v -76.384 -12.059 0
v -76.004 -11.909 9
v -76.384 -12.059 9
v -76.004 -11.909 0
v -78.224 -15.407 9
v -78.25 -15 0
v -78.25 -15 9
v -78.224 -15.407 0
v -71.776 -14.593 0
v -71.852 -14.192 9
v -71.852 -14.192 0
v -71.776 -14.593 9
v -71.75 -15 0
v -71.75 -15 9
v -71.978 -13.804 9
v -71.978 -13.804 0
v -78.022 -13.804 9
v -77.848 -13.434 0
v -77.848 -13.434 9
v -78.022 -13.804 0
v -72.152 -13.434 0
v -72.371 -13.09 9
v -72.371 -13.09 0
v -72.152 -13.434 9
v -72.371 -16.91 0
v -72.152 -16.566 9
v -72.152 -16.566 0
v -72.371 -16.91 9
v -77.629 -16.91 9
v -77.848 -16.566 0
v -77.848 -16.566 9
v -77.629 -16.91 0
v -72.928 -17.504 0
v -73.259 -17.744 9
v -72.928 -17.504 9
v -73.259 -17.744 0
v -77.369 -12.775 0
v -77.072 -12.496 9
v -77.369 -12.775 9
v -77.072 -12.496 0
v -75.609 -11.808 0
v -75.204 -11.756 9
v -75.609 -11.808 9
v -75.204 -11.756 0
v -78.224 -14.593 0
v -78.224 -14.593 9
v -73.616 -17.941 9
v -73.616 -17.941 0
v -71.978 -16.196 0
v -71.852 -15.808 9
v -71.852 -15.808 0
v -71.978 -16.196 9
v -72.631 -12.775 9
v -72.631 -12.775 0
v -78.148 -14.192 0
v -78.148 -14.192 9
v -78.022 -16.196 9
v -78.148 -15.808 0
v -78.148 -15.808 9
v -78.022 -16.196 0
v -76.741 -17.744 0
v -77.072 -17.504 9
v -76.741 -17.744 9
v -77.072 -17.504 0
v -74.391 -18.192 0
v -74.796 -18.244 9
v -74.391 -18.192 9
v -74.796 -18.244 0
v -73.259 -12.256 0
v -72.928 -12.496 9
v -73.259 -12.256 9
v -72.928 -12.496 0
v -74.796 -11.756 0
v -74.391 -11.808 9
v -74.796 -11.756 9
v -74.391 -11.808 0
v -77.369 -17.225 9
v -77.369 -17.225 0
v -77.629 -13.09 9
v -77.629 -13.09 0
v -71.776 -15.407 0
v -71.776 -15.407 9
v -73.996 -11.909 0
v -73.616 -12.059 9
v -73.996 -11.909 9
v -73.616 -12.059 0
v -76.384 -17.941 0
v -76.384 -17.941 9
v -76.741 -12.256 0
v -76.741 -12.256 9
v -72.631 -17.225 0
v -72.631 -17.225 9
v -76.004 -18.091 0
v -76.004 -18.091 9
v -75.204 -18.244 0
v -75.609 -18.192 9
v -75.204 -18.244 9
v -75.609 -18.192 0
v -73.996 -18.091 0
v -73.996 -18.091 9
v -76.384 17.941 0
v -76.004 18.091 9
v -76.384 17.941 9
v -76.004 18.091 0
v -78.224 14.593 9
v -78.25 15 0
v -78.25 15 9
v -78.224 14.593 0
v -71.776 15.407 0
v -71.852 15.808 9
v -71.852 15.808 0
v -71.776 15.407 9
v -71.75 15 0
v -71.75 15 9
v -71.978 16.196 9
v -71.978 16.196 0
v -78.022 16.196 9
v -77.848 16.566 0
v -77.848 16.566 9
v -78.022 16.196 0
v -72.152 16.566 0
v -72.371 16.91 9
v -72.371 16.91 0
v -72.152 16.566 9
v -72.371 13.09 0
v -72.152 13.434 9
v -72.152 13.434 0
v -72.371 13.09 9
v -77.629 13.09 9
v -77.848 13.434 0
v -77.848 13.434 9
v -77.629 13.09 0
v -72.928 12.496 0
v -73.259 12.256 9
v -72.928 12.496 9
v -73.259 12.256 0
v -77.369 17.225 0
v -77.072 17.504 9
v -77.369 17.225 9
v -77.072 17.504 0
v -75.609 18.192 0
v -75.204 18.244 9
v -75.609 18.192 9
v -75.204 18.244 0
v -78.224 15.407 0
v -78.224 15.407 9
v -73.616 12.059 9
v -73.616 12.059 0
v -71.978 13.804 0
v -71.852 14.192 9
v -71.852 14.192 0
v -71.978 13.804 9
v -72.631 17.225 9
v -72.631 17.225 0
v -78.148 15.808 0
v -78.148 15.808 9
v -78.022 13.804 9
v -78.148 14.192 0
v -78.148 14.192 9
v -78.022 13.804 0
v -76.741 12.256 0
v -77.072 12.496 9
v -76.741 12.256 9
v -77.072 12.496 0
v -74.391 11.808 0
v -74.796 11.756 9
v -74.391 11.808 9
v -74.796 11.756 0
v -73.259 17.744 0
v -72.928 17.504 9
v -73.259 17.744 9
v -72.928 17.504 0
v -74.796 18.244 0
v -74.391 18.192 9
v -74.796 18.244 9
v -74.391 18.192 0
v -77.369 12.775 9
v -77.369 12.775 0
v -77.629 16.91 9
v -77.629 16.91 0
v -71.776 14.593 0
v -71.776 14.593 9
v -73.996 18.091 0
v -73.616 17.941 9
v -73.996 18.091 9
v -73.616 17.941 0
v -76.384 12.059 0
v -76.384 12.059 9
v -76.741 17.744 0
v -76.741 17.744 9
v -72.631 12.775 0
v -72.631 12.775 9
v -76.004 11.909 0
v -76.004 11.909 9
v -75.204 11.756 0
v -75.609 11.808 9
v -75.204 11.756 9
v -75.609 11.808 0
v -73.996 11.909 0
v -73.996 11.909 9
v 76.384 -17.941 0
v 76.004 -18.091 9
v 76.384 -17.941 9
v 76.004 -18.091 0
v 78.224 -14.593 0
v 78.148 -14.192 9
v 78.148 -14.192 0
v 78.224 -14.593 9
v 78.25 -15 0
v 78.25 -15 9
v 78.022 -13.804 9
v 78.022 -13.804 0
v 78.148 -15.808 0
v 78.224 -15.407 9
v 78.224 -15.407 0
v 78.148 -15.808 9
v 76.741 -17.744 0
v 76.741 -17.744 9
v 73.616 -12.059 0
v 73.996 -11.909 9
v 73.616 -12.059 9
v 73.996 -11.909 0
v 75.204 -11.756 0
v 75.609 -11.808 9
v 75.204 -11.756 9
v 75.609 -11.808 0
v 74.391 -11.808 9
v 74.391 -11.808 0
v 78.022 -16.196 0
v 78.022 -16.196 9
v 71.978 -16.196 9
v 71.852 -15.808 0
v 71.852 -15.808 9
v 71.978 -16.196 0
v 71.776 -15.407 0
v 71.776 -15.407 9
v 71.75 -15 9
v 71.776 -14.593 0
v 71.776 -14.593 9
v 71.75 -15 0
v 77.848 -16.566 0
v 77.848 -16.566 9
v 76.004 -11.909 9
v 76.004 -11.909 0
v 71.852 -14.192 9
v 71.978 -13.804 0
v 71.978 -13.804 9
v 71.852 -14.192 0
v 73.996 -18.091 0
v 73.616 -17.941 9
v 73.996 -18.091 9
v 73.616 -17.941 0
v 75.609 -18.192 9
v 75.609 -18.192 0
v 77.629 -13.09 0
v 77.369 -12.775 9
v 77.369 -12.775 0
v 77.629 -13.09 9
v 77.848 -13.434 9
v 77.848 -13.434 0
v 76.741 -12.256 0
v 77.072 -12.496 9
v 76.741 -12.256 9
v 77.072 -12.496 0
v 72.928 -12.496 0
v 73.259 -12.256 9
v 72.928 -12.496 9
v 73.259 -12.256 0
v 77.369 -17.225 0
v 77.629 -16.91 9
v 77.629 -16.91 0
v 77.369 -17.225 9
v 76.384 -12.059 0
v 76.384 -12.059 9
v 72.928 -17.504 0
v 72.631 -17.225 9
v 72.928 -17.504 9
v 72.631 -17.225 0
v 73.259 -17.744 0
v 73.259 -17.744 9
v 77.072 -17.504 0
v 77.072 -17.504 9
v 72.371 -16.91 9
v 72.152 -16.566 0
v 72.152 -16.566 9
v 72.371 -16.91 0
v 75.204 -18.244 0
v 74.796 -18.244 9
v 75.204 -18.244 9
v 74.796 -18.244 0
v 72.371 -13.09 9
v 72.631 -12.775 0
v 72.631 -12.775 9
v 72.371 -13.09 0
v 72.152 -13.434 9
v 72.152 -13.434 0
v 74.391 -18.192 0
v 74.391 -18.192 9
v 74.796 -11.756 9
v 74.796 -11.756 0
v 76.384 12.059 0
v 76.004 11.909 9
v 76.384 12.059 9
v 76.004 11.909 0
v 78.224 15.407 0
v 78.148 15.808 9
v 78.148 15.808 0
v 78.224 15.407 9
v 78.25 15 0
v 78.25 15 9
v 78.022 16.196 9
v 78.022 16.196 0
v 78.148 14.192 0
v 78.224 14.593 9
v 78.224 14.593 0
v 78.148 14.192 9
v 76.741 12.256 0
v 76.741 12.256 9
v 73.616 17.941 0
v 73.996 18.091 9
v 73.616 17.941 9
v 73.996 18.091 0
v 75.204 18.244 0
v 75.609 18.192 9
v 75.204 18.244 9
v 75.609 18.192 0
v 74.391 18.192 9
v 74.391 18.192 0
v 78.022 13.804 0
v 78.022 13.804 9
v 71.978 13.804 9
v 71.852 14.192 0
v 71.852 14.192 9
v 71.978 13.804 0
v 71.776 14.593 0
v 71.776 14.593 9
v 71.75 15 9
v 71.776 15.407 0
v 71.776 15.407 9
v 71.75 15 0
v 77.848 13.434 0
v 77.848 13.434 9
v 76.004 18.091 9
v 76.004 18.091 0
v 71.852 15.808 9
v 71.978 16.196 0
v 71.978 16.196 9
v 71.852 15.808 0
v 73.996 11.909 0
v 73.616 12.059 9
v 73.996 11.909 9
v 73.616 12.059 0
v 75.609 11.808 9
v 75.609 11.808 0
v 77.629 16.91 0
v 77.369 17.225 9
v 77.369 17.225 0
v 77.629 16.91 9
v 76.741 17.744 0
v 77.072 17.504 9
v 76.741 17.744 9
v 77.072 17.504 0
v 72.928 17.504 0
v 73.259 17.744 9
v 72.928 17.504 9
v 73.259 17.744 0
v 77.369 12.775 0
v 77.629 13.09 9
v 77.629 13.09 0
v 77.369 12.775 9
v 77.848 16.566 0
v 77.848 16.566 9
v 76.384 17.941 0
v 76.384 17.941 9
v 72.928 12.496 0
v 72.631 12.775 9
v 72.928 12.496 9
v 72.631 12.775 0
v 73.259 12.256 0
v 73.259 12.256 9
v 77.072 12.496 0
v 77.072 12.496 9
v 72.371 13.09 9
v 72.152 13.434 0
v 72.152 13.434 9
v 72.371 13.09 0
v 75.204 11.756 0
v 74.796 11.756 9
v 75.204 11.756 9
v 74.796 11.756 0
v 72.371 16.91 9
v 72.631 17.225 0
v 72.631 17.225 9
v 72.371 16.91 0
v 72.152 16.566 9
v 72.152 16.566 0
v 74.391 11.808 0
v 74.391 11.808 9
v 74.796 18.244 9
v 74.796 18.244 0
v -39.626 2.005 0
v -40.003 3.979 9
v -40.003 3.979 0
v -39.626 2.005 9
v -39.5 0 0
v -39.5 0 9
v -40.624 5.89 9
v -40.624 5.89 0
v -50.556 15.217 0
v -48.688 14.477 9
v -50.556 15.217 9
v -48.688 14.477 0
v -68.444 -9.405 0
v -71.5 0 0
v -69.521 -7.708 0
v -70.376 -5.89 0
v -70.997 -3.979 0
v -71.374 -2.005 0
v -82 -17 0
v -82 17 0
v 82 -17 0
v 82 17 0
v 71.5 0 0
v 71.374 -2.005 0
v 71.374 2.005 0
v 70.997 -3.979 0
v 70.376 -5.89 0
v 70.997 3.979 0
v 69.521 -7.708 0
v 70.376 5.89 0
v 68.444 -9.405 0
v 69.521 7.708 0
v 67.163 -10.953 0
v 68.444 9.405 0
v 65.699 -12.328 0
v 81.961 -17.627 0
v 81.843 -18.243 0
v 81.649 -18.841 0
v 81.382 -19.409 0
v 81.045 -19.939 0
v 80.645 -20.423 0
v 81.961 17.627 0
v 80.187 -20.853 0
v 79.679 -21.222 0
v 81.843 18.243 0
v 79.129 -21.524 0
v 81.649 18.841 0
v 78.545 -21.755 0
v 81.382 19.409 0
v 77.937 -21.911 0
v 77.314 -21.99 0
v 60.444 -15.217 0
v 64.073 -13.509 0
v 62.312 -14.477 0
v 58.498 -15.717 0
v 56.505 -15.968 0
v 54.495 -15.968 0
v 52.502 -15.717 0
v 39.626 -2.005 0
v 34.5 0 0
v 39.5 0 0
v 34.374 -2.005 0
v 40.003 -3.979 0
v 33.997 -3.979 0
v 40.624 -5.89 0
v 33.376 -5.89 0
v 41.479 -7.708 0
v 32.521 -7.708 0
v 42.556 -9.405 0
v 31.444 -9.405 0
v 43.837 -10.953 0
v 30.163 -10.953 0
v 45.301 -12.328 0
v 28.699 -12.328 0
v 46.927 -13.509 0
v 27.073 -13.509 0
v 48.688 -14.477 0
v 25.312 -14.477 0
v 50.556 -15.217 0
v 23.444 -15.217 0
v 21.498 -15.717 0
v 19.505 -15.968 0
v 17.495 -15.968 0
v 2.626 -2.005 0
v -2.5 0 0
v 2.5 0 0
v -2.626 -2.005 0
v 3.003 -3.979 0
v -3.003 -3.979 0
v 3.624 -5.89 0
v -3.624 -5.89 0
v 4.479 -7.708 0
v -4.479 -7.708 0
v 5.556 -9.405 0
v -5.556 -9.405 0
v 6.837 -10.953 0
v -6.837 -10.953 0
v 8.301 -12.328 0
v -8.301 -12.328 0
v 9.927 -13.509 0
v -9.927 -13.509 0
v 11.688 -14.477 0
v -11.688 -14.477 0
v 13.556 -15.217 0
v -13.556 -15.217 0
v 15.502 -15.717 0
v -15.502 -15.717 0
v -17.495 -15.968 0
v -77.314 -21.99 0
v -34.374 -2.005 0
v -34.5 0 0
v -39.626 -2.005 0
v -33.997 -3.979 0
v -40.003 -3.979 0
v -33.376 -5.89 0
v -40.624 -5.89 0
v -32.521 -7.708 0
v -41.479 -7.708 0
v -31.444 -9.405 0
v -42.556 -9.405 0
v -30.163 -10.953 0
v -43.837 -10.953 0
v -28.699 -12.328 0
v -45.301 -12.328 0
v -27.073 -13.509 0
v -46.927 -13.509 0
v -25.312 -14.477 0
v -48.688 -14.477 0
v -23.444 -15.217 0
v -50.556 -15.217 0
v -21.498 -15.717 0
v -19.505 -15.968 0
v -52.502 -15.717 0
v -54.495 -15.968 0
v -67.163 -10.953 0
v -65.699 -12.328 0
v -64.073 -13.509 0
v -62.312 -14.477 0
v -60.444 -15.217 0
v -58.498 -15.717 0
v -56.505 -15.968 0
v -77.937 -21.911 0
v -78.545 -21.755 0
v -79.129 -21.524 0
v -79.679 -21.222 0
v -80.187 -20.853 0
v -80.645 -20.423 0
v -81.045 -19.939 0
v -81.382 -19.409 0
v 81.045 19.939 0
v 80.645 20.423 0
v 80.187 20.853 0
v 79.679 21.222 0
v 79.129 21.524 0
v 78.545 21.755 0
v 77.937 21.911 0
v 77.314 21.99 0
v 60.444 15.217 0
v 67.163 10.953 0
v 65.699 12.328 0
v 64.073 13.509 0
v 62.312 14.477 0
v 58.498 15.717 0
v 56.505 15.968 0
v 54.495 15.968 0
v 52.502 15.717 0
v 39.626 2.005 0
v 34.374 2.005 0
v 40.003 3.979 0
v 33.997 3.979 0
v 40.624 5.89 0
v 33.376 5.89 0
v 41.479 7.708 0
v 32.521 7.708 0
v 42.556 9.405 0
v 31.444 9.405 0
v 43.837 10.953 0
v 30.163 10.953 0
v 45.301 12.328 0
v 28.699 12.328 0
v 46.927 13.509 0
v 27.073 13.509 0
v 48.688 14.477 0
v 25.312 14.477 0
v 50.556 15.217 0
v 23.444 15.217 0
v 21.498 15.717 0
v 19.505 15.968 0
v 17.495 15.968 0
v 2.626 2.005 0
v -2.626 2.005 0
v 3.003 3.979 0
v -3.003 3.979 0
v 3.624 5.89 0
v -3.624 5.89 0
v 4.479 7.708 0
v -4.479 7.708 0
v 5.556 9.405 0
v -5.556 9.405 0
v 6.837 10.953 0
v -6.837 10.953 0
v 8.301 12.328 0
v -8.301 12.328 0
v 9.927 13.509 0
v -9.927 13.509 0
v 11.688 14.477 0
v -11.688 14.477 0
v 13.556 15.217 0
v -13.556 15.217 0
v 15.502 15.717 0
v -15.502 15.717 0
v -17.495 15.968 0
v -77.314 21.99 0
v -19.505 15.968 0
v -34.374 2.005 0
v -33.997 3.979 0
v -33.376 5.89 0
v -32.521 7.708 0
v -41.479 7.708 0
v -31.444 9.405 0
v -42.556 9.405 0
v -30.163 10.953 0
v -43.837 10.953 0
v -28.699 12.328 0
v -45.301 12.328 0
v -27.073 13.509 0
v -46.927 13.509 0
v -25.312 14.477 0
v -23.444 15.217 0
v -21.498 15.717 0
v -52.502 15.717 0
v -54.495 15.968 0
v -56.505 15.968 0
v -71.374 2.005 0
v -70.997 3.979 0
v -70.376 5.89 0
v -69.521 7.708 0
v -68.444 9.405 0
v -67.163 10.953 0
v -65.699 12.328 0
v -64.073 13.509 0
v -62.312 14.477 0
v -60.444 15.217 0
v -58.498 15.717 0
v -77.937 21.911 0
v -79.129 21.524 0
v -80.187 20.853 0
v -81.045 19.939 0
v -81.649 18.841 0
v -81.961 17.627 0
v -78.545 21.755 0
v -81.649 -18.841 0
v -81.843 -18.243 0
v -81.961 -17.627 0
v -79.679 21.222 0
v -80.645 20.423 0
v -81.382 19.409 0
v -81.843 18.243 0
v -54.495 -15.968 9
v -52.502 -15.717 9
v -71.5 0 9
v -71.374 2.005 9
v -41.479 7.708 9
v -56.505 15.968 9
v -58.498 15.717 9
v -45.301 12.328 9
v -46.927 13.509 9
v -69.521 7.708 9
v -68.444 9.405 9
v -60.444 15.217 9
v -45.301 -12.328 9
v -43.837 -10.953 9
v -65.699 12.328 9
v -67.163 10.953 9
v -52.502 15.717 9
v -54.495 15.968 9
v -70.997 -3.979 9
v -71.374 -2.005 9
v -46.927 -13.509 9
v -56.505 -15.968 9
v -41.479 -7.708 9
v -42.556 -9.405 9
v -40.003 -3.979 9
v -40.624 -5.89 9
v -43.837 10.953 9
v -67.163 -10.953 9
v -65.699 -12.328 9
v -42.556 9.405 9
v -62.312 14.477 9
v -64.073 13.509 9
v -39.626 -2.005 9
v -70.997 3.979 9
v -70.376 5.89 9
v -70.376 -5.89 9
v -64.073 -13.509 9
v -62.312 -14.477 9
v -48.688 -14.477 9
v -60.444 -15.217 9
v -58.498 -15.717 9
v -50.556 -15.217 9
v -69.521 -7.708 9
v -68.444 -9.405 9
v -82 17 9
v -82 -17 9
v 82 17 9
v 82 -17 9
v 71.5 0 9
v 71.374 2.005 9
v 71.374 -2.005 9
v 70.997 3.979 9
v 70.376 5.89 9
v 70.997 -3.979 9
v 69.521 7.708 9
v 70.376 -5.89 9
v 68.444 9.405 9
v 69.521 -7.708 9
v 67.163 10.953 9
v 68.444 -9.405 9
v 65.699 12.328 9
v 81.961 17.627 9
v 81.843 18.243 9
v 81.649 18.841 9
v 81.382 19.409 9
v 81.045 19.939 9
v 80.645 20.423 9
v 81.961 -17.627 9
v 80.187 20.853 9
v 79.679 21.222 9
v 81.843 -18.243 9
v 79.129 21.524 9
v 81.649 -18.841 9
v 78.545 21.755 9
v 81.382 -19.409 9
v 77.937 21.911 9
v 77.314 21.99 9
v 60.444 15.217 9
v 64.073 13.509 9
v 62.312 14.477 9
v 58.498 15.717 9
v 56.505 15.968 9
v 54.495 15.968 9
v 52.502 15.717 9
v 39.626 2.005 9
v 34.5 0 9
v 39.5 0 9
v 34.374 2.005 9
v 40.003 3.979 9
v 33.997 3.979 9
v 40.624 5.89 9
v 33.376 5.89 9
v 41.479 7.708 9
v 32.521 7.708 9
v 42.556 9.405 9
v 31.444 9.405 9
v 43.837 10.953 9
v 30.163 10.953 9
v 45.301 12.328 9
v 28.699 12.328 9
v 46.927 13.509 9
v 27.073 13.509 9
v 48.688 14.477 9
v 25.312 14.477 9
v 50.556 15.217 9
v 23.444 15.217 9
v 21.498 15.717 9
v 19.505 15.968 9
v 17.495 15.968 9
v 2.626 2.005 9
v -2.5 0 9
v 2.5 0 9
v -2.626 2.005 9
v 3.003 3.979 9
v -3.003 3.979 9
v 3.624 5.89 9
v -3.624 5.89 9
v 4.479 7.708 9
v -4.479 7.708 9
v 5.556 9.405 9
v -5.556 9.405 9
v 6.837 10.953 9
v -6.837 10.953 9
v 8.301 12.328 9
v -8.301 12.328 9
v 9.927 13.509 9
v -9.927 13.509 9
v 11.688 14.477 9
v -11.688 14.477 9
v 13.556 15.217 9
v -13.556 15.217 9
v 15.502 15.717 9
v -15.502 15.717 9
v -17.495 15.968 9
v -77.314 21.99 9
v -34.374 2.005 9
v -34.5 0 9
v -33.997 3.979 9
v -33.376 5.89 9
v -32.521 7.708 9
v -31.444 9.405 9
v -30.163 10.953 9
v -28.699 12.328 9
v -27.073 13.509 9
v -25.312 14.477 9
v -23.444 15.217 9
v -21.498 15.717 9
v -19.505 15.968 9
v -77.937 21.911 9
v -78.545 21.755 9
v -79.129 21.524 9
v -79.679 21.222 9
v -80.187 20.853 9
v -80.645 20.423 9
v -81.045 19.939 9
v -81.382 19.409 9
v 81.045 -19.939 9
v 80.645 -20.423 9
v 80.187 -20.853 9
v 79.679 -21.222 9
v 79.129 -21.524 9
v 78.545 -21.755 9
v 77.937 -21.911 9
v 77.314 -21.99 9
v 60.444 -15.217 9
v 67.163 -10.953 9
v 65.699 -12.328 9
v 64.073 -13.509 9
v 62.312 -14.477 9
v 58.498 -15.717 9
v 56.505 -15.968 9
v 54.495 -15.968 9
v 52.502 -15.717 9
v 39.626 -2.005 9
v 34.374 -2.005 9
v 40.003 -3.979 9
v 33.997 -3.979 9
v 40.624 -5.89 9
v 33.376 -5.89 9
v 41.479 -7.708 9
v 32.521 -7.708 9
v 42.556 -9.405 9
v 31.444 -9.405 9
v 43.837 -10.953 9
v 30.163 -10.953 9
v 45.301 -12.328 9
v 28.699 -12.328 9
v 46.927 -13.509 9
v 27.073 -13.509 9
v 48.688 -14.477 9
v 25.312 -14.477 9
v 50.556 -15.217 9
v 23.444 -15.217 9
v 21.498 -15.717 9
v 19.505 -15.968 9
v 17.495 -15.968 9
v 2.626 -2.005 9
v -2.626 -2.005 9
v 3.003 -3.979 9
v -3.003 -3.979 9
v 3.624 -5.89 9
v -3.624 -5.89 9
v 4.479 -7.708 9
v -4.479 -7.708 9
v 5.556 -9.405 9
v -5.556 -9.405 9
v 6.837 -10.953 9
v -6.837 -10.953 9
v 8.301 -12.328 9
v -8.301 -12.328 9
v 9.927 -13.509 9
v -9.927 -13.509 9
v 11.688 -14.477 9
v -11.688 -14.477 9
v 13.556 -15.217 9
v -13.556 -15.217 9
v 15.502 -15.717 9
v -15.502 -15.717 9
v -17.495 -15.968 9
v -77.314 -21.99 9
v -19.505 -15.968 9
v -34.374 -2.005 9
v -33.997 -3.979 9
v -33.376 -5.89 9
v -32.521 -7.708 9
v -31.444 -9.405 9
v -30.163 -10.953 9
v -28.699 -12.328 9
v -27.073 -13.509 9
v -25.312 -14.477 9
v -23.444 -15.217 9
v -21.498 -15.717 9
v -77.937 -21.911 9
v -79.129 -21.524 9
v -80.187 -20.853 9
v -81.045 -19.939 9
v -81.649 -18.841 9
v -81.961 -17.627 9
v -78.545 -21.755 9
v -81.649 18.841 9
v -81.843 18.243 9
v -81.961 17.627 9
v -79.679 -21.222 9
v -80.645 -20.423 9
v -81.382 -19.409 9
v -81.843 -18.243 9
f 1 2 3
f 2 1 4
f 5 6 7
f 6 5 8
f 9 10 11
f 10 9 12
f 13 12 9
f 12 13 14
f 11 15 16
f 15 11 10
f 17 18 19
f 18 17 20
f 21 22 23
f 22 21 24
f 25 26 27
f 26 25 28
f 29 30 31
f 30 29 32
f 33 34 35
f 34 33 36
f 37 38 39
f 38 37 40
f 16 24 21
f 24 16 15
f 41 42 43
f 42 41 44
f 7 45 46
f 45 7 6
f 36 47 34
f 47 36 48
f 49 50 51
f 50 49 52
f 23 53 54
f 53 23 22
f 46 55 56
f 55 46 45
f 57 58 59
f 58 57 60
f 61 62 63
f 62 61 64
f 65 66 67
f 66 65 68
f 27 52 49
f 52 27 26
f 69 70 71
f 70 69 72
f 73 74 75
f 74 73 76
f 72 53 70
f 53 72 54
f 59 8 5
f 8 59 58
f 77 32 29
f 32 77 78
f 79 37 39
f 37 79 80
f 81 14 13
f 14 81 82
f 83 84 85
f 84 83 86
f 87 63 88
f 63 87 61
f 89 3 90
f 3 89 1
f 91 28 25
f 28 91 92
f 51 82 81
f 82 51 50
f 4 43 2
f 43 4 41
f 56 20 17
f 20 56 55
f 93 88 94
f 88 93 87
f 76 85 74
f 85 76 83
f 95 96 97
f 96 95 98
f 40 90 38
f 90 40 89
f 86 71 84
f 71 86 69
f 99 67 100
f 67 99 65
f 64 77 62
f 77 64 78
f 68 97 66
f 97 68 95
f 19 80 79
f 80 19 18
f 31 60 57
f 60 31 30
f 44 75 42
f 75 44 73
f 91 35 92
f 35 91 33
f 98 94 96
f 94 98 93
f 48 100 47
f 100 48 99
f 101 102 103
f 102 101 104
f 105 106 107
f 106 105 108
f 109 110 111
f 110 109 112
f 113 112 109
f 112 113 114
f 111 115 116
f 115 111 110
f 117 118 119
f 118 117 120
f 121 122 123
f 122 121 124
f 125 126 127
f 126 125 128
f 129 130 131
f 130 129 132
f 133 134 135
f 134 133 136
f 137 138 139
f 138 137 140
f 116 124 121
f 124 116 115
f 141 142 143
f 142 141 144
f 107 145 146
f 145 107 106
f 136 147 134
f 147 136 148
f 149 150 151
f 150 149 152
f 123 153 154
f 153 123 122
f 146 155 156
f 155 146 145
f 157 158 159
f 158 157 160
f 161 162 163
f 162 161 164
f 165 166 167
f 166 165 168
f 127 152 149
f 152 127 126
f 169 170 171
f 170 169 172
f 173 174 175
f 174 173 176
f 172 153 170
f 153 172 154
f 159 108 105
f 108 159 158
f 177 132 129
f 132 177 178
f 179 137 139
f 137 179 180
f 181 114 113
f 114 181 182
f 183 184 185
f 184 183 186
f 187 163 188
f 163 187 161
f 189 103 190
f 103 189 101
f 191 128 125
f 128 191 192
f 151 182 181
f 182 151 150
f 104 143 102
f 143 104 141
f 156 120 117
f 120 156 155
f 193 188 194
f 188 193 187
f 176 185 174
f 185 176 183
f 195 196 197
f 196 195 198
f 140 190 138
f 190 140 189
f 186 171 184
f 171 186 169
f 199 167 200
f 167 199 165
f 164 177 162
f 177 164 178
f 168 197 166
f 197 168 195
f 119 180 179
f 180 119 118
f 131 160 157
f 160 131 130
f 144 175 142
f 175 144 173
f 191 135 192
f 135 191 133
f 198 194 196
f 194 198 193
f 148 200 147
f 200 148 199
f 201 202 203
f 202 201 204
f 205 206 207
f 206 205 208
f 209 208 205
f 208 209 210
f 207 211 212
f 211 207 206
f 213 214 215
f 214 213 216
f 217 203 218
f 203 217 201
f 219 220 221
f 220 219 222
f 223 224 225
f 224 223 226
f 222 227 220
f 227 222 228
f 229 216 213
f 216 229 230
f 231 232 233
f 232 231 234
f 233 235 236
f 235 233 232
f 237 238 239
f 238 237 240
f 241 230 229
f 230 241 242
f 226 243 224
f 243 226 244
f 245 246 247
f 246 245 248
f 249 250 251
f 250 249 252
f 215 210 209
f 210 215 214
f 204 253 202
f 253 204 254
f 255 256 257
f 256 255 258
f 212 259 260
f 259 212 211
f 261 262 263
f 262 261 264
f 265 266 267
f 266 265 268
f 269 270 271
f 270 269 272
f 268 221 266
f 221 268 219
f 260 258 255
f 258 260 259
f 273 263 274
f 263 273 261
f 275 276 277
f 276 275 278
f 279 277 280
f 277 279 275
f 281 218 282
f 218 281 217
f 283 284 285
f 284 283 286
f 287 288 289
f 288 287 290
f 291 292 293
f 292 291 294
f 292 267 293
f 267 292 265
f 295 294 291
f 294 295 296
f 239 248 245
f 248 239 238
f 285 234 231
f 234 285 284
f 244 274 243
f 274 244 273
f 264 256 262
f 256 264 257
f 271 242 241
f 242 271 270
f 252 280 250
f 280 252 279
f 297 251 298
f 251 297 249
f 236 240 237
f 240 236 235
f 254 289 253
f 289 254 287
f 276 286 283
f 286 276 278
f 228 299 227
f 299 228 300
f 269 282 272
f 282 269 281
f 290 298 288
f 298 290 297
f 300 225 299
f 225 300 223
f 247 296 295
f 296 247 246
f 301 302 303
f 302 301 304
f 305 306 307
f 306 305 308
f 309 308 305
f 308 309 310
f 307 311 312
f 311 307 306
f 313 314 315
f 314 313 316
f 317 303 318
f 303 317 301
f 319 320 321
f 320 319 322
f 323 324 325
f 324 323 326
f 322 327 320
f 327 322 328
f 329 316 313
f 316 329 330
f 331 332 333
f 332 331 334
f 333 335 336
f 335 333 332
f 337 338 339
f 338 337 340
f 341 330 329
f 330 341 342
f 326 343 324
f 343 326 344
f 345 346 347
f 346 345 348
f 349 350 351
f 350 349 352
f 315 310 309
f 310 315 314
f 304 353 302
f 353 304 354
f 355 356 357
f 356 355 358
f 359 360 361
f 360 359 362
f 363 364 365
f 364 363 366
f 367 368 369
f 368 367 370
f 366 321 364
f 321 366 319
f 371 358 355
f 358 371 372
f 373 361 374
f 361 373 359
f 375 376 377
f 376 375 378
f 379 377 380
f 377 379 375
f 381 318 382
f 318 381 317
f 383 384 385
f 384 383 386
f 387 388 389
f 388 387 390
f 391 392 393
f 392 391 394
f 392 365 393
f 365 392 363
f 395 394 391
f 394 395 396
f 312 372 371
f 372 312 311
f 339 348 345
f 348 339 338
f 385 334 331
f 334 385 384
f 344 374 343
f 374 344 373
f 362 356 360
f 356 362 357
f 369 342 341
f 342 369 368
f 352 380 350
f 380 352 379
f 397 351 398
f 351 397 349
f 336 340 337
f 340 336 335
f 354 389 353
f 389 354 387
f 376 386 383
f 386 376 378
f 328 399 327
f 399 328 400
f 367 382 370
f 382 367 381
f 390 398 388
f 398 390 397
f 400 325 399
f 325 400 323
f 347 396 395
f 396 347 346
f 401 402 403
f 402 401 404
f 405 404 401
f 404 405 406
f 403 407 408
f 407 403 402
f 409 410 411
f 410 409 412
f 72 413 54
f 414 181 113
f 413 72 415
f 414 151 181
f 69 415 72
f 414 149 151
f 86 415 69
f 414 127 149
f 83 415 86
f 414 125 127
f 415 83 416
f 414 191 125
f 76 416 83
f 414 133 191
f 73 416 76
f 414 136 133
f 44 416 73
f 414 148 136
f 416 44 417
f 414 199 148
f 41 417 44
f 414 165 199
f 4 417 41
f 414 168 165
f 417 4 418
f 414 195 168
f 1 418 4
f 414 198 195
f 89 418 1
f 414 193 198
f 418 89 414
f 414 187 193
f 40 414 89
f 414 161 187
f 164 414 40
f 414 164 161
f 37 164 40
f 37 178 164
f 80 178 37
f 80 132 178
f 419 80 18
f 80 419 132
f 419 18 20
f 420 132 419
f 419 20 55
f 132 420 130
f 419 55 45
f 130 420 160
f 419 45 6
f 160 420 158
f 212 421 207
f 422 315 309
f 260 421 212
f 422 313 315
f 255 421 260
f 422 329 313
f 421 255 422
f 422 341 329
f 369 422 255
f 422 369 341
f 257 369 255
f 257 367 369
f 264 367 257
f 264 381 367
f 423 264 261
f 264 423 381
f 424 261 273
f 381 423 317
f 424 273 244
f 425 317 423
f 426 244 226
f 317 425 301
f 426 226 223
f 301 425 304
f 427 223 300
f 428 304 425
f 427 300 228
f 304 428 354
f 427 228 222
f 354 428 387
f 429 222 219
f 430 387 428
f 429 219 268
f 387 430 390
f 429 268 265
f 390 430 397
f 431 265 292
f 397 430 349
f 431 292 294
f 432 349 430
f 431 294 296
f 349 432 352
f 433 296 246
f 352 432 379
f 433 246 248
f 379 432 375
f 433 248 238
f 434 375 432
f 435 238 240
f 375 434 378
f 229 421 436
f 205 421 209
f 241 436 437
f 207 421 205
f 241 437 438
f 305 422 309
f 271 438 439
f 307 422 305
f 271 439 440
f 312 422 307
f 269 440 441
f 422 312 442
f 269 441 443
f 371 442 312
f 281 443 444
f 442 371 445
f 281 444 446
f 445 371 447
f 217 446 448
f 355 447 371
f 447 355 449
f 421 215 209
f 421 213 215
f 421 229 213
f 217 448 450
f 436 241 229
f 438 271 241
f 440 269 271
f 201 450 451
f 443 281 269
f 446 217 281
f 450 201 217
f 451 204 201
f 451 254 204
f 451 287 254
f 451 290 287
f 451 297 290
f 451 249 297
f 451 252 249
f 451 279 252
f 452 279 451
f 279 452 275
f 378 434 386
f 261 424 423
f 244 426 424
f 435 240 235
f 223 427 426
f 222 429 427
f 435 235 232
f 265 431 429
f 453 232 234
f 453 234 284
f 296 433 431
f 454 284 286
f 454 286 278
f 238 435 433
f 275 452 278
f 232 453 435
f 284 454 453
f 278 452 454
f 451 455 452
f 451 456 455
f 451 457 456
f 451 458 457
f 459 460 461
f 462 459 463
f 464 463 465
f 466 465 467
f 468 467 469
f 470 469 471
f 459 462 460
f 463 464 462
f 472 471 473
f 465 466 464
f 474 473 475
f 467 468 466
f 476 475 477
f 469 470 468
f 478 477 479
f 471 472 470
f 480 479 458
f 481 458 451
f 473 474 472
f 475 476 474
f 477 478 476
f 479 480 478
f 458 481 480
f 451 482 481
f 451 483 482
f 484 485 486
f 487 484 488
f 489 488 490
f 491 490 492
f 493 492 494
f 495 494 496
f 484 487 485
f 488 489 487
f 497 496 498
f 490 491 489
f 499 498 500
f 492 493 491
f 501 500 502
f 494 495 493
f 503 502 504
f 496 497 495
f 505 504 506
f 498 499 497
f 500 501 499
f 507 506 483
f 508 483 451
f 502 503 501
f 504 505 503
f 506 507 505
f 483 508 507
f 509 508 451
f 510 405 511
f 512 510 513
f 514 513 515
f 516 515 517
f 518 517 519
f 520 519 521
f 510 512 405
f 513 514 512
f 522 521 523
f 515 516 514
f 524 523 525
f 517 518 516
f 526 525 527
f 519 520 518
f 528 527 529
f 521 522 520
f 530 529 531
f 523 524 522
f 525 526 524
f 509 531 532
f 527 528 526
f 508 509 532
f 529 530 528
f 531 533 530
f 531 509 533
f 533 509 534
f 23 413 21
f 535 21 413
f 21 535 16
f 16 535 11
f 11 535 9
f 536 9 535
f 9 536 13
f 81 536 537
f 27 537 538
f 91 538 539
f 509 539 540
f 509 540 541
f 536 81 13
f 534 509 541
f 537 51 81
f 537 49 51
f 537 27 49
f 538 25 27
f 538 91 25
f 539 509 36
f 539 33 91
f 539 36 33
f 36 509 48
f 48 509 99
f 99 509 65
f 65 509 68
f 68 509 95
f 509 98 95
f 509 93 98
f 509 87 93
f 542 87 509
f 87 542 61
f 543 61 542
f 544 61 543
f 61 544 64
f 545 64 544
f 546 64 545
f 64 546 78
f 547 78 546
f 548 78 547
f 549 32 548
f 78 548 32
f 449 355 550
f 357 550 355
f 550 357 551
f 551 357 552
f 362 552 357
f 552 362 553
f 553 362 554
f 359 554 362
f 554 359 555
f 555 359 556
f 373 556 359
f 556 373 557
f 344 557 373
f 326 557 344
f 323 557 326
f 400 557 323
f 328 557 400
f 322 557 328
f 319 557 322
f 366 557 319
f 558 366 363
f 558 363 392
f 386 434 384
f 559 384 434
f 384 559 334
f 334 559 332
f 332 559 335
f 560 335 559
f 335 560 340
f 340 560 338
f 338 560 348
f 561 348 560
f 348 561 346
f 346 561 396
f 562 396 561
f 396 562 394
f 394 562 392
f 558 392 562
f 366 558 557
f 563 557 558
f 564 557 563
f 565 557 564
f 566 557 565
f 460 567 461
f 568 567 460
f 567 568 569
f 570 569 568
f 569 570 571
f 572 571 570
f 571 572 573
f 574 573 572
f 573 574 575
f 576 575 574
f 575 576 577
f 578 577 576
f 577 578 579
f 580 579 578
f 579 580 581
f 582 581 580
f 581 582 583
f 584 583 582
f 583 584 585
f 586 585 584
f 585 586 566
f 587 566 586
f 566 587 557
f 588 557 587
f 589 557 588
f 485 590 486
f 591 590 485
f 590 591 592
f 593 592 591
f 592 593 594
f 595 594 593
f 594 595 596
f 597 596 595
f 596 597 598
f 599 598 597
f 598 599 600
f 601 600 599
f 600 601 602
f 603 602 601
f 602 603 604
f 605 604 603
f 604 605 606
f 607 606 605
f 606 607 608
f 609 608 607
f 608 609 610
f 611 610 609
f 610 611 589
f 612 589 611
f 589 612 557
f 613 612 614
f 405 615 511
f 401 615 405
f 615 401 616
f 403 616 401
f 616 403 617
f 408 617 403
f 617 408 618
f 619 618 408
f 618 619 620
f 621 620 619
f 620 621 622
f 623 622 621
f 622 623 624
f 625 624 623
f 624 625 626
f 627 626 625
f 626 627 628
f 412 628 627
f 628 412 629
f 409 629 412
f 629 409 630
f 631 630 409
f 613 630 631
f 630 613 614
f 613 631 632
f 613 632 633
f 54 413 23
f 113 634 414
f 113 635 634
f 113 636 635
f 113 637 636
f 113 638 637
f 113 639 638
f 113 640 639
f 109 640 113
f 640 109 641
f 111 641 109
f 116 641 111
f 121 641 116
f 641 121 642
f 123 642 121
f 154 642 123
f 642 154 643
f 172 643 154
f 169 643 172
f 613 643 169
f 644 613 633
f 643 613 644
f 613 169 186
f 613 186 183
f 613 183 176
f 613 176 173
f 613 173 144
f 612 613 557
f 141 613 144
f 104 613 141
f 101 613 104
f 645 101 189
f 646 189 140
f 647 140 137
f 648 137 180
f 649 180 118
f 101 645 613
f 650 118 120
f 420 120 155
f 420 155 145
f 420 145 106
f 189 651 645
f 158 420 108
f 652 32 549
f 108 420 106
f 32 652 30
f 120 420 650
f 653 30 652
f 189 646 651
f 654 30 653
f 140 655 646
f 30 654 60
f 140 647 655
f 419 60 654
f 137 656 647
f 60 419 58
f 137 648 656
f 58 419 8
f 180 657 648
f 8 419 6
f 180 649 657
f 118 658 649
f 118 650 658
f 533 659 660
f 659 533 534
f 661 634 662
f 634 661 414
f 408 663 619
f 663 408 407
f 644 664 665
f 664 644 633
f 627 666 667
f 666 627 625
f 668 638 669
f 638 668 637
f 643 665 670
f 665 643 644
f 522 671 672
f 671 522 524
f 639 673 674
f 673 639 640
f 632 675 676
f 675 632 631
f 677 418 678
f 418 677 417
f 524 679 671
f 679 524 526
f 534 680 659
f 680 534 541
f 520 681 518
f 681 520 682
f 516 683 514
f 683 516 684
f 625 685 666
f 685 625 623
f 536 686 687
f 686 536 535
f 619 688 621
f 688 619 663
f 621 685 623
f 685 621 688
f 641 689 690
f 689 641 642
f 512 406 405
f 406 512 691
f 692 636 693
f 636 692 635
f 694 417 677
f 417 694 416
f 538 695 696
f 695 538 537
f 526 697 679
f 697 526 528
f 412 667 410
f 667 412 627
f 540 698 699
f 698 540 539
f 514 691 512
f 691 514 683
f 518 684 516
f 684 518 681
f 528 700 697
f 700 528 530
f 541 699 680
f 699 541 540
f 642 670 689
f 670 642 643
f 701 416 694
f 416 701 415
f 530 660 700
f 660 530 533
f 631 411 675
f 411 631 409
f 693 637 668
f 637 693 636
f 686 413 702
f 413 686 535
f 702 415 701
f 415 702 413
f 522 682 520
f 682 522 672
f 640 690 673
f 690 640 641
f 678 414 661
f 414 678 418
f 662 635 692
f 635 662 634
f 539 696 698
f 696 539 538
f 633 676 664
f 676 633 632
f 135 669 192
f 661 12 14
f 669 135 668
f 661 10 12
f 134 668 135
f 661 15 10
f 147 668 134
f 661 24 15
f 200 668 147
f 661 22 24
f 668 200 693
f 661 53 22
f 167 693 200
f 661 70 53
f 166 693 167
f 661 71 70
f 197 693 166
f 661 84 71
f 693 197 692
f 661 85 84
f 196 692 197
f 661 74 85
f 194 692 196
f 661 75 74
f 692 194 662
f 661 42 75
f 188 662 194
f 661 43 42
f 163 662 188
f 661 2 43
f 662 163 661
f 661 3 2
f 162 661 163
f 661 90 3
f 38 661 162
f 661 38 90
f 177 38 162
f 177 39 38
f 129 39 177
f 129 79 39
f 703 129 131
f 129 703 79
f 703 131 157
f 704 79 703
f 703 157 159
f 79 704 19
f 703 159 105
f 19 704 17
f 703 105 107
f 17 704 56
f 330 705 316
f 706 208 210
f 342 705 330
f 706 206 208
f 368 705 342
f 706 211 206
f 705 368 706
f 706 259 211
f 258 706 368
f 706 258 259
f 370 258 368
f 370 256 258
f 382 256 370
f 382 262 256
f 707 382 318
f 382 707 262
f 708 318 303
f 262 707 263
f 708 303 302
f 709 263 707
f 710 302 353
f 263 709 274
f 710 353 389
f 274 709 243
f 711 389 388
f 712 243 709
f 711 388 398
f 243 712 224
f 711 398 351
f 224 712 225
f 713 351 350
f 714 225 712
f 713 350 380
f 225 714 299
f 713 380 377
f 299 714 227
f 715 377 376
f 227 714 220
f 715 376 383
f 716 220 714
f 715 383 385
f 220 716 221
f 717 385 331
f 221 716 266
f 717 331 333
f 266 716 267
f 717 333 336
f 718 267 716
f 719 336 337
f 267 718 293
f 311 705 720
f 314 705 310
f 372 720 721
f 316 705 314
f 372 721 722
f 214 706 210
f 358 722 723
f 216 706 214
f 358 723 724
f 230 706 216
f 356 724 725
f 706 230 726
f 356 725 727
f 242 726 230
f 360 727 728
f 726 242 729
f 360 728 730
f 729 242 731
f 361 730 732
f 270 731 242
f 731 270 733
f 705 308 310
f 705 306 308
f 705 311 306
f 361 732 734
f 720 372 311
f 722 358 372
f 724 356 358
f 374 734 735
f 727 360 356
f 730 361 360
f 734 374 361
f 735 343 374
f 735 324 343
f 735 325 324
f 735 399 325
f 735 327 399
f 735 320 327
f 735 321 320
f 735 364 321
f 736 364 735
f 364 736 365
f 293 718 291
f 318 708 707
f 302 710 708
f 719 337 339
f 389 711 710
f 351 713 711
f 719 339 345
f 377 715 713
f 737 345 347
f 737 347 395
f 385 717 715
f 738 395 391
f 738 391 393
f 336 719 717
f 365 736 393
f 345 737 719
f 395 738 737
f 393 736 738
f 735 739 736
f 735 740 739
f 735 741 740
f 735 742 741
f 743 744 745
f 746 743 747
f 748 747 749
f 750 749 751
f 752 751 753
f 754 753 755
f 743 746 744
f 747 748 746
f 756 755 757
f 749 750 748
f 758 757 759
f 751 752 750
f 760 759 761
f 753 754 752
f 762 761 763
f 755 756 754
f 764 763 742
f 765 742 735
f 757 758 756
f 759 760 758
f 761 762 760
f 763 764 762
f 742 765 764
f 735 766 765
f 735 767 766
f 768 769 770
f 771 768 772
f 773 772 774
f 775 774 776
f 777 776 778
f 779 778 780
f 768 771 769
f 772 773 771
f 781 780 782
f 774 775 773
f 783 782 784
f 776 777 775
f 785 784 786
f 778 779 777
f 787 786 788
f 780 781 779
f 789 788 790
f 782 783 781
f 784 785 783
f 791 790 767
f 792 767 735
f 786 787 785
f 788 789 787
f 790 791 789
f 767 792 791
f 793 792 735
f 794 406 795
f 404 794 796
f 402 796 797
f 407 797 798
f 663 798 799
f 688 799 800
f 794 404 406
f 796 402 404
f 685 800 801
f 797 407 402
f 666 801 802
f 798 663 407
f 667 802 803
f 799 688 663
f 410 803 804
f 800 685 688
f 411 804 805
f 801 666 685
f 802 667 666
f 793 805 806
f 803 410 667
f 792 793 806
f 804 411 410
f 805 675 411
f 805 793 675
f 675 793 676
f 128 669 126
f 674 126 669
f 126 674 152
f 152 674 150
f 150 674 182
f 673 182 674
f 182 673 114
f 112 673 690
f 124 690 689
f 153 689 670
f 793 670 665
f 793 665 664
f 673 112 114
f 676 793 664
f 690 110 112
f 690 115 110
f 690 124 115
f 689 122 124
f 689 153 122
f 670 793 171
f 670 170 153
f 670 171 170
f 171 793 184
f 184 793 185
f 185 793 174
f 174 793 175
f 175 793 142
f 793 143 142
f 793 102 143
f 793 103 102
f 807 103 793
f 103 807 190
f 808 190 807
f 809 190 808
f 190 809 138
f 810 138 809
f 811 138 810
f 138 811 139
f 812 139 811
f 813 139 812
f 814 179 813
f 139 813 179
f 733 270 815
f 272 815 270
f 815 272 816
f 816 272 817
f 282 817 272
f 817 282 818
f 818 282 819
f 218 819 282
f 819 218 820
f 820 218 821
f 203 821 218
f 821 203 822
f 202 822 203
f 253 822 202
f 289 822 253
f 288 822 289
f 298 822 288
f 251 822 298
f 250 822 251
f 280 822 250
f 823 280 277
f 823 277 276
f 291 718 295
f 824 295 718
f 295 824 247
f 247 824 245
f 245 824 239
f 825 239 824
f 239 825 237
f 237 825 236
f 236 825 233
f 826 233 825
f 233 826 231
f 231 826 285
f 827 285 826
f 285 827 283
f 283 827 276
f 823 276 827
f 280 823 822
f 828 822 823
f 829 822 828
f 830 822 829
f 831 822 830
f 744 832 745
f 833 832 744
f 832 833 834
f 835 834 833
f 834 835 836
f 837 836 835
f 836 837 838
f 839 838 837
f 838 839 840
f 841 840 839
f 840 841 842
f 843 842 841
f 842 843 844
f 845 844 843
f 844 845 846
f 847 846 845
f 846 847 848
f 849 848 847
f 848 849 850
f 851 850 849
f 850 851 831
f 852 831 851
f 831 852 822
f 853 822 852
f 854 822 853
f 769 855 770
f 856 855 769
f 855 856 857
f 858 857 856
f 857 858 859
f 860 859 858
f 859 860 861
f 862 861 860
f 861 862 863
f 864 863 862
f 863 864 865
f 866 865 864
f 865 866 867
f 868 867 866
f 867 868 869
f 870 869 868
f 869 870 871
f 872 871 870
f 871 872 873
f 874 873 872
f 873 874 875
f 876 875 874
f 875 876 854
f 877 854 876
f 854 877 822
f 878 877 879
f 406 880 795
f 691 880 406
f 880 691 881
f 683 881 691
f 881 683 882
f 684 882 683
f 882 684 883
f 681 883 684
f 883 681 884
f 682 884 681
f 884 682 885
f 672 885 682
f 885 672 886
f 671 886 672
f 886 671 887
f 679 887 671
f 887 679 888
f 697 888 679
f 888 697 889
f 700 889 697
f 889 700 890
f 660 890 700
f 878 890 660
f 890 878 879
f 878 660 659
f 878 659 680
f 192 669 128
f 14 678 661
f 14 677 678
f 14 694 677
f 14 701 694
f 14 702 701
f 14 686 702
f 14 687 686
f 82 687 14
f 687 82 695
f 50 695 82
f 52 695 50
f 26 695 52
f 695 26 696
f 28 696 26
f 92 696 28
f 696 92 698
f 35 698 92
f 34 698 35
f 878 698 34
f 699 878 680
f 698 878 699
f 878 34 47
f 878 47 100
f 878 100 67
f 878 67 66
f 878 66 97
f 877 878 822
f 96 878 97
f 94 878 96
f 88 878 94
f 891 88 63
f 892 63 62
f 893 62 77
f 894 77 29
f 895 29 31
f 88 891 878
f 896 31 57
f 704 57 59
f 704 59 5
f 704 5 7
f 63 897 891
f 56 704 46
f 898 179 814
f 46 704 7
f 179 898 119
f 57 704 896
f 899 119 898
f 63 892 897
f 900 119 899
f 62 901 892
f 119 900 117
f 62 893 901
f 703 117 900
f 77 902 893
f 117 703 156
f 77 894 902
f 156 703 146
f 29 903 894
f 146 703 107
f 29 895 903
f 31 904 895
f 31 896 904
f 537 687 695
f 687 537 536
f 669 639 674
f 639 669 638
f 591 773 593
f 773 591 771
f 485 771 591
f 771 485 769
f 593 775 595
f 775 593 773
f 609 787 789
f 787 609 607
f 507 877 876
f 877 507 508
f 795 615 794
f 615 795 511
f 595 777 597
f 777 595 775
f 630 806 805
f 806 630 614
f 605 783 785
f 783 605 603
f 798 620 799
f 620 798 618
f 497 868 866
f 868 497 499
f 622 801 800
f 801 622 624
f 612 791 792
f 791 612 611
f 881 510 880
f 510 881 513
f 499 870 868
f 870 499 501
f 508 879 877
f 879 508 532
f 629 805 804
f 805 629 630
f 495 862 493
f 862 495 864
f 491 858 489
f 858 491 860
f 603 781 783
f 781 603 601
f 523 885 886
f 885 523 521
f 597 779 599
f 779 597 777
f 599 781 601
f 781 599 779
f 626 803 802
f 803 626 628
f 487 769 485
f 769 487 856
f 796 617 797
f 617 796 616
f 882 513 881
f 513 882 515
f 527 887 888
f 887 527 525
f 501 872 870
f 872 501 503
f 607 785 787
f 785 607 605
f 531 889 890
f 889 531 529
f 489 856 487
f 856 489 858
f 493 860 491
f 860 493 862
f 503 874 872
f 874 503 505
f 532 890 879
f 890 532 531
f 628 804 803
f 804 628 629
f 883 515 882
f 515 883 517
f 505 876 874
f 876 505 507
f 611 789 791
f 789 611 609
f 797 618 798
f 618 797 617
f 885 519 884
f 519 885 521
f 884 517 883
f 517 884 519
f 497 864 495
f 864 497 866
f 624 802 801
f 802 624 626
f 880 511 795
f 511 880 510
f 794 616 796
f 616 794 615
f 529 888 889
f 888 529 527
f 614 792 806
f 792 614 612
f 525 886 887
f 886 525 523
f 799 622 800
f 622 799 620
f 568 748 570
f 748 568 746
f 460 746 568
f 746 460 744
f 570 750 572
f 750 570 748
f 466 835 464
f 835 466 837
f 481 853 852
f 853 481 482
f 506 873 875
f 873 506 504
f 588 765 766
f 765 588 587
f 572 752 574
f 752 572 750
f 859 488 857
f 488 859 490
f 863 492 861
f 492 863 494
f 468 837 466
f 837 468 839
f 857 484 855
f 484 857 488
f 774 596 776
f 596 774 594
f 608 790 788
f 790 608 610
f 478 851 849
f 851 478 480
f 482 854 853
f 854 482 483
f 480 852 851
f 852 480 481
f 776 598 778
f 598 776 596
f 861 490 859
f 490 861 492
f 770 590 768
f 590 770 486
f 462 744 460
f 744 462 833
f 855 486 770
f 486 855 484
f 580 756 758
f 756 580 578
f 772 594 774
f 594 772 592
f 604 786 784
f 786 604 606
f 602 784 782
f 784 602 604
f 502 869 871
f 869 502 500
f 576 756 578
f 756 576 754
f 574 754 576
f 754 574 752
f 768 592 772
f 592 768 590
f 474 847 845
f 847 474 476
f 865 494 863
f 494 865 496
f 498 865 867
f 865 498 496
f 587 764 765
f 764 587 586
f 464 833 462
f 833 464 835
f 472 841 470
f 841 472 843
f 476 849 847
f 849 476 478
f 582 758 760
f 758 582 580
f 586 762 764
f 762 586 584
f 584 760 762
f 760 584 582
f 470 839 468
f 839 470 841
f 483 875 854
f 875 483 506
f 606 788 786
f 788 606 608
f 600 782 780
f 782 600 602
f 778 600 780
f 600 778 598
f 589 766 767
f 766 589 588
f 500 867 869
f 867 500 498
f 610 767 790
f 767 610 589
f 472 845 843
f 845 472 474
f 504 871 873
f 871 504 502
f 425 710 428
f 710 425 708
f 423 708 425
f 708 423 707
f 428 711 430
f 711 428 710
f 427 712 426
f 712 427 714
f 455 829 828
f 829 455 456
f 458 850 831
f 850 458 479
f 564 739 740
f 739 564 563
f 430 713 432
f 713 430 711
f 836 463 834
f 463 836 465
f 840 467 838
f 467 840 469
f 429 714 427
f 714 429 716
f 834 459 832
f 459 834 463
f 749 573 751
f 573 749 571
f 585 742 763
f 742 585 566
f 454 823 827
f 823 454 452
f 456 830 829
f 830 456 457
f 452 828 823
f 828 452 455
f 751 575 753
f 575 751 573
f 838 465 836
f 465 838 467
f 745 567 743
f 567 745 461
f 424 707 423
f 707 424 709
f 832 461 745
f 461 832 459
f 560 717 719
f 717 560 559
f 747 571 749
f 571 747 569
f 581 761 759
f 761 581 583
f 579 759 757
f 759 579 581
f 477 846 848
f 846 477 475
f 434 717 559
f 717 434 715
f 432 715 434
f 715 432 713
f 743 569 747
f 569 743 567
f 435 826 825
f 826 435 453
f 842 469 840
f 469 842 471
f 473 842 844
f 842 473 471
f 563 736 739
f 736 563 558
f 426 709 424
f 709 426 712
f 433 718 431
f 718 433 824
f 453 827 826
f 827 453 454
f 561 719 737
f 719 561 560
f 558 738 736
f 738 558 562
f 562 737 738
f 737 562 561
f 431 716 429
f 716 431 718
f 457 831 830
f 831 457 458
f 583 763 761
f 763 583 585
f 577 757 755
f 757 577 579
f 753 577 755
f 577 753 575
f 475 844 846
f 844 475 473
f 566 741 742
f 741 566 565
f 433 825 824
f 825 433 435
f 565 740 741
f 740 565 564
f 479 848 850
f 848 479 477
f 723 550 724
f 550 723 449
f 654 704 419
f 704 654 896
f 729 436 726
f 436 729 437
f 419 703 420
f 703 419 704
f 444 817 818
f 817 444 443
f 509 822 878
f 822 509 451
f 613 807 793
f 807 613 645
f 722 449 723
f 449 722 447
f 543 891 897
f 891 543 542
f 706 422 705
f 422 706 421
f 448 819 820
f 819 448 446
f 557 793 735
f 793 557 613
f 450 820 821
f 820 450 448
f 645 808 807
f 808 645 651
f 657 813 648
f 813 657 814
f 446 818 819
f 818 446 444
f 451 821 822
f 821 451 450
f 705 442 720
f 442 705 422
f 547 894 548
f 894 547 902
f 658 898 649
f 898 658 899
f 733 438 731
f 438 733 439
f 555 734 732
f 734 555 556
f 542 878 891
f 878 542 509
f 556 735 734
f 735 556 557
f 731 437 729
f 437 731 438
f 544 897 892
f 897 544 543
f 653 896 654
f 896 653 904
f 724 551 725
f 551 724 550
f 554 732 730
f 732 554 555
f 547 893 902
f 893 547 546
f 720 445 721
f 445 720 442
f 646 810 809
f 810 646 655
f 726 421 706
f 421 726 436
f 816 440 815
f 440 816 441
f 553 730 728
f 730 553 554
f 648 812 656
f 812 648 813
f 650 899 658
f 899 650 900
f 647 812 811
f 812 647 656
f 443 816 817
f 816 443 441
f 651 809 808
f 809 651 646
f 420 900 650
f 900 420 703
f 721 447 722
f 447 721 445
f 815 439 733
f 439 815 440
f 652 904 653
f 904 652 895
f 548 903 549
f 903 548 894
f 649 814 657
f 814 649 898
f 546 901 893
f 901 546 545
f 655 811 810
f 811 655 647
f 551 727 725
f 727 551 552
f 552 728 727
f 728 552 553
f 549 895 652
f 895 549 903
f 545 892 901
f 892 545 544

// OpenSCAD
$fn = 50;


difference() {
	union() {
		hull() {
			translate(v = [-77.0000000000, 17.0000000000, 0]) {
				cylinder(h = 9, r = 5);
			}
			translate(v = [77.0000000000, 17.0000000000, 0]) {
				cylinder(h = 9, r = 5);
			}
			translate(v = [-77.0000000000, -17.0000000000, 0]) {
				cylinder(h = 9, r = 5);
			}
			translate(v = [77.0000000000, -17.0000000000, 0]) {
				cylinder(h = 9, r = 5);
			}
		}
	}
	union() {
		#translate(v = [-75.0000000000, -15.0000000000, -100.0000000000]) {
			cylinder(h = 200, r = 3.2500000000);
		}
		#translate(v = [-75.0000000000, 15.0000000000, -100.0000000000]) {
			cylinder(h = 200, r = 3.2500000000);
		}
		#translate(v = [75.0000000000, -15.0000000000, -100.0000000000]) {
			cylinder(h = 200, r = 3.2500000000);
		}
		#translate(v = [75.0000000000, 15.0000000000, -100.0000000000]) {
			cylinder(h = 200, r = 3.2500000000);
		}
		#translate(v = [-55.5000000000, 0, 0]) {
			cylinder(h = 9, r = 16.0000000000);
		}
		#translate(v = [-18.5000000000, 0, 0]) {
			cylinder(h = 9, r = 16.0000000000);
		}
		#translate(v = [18.5000000000, 0, 0]) {
			cylinder(h = 9, r = 16.0000000000);
		}
		#translate(v = [55.5000000000, 0, 0]) {
			cylinder(h = 9, r = 16.0000000000);
		}
	}
}
